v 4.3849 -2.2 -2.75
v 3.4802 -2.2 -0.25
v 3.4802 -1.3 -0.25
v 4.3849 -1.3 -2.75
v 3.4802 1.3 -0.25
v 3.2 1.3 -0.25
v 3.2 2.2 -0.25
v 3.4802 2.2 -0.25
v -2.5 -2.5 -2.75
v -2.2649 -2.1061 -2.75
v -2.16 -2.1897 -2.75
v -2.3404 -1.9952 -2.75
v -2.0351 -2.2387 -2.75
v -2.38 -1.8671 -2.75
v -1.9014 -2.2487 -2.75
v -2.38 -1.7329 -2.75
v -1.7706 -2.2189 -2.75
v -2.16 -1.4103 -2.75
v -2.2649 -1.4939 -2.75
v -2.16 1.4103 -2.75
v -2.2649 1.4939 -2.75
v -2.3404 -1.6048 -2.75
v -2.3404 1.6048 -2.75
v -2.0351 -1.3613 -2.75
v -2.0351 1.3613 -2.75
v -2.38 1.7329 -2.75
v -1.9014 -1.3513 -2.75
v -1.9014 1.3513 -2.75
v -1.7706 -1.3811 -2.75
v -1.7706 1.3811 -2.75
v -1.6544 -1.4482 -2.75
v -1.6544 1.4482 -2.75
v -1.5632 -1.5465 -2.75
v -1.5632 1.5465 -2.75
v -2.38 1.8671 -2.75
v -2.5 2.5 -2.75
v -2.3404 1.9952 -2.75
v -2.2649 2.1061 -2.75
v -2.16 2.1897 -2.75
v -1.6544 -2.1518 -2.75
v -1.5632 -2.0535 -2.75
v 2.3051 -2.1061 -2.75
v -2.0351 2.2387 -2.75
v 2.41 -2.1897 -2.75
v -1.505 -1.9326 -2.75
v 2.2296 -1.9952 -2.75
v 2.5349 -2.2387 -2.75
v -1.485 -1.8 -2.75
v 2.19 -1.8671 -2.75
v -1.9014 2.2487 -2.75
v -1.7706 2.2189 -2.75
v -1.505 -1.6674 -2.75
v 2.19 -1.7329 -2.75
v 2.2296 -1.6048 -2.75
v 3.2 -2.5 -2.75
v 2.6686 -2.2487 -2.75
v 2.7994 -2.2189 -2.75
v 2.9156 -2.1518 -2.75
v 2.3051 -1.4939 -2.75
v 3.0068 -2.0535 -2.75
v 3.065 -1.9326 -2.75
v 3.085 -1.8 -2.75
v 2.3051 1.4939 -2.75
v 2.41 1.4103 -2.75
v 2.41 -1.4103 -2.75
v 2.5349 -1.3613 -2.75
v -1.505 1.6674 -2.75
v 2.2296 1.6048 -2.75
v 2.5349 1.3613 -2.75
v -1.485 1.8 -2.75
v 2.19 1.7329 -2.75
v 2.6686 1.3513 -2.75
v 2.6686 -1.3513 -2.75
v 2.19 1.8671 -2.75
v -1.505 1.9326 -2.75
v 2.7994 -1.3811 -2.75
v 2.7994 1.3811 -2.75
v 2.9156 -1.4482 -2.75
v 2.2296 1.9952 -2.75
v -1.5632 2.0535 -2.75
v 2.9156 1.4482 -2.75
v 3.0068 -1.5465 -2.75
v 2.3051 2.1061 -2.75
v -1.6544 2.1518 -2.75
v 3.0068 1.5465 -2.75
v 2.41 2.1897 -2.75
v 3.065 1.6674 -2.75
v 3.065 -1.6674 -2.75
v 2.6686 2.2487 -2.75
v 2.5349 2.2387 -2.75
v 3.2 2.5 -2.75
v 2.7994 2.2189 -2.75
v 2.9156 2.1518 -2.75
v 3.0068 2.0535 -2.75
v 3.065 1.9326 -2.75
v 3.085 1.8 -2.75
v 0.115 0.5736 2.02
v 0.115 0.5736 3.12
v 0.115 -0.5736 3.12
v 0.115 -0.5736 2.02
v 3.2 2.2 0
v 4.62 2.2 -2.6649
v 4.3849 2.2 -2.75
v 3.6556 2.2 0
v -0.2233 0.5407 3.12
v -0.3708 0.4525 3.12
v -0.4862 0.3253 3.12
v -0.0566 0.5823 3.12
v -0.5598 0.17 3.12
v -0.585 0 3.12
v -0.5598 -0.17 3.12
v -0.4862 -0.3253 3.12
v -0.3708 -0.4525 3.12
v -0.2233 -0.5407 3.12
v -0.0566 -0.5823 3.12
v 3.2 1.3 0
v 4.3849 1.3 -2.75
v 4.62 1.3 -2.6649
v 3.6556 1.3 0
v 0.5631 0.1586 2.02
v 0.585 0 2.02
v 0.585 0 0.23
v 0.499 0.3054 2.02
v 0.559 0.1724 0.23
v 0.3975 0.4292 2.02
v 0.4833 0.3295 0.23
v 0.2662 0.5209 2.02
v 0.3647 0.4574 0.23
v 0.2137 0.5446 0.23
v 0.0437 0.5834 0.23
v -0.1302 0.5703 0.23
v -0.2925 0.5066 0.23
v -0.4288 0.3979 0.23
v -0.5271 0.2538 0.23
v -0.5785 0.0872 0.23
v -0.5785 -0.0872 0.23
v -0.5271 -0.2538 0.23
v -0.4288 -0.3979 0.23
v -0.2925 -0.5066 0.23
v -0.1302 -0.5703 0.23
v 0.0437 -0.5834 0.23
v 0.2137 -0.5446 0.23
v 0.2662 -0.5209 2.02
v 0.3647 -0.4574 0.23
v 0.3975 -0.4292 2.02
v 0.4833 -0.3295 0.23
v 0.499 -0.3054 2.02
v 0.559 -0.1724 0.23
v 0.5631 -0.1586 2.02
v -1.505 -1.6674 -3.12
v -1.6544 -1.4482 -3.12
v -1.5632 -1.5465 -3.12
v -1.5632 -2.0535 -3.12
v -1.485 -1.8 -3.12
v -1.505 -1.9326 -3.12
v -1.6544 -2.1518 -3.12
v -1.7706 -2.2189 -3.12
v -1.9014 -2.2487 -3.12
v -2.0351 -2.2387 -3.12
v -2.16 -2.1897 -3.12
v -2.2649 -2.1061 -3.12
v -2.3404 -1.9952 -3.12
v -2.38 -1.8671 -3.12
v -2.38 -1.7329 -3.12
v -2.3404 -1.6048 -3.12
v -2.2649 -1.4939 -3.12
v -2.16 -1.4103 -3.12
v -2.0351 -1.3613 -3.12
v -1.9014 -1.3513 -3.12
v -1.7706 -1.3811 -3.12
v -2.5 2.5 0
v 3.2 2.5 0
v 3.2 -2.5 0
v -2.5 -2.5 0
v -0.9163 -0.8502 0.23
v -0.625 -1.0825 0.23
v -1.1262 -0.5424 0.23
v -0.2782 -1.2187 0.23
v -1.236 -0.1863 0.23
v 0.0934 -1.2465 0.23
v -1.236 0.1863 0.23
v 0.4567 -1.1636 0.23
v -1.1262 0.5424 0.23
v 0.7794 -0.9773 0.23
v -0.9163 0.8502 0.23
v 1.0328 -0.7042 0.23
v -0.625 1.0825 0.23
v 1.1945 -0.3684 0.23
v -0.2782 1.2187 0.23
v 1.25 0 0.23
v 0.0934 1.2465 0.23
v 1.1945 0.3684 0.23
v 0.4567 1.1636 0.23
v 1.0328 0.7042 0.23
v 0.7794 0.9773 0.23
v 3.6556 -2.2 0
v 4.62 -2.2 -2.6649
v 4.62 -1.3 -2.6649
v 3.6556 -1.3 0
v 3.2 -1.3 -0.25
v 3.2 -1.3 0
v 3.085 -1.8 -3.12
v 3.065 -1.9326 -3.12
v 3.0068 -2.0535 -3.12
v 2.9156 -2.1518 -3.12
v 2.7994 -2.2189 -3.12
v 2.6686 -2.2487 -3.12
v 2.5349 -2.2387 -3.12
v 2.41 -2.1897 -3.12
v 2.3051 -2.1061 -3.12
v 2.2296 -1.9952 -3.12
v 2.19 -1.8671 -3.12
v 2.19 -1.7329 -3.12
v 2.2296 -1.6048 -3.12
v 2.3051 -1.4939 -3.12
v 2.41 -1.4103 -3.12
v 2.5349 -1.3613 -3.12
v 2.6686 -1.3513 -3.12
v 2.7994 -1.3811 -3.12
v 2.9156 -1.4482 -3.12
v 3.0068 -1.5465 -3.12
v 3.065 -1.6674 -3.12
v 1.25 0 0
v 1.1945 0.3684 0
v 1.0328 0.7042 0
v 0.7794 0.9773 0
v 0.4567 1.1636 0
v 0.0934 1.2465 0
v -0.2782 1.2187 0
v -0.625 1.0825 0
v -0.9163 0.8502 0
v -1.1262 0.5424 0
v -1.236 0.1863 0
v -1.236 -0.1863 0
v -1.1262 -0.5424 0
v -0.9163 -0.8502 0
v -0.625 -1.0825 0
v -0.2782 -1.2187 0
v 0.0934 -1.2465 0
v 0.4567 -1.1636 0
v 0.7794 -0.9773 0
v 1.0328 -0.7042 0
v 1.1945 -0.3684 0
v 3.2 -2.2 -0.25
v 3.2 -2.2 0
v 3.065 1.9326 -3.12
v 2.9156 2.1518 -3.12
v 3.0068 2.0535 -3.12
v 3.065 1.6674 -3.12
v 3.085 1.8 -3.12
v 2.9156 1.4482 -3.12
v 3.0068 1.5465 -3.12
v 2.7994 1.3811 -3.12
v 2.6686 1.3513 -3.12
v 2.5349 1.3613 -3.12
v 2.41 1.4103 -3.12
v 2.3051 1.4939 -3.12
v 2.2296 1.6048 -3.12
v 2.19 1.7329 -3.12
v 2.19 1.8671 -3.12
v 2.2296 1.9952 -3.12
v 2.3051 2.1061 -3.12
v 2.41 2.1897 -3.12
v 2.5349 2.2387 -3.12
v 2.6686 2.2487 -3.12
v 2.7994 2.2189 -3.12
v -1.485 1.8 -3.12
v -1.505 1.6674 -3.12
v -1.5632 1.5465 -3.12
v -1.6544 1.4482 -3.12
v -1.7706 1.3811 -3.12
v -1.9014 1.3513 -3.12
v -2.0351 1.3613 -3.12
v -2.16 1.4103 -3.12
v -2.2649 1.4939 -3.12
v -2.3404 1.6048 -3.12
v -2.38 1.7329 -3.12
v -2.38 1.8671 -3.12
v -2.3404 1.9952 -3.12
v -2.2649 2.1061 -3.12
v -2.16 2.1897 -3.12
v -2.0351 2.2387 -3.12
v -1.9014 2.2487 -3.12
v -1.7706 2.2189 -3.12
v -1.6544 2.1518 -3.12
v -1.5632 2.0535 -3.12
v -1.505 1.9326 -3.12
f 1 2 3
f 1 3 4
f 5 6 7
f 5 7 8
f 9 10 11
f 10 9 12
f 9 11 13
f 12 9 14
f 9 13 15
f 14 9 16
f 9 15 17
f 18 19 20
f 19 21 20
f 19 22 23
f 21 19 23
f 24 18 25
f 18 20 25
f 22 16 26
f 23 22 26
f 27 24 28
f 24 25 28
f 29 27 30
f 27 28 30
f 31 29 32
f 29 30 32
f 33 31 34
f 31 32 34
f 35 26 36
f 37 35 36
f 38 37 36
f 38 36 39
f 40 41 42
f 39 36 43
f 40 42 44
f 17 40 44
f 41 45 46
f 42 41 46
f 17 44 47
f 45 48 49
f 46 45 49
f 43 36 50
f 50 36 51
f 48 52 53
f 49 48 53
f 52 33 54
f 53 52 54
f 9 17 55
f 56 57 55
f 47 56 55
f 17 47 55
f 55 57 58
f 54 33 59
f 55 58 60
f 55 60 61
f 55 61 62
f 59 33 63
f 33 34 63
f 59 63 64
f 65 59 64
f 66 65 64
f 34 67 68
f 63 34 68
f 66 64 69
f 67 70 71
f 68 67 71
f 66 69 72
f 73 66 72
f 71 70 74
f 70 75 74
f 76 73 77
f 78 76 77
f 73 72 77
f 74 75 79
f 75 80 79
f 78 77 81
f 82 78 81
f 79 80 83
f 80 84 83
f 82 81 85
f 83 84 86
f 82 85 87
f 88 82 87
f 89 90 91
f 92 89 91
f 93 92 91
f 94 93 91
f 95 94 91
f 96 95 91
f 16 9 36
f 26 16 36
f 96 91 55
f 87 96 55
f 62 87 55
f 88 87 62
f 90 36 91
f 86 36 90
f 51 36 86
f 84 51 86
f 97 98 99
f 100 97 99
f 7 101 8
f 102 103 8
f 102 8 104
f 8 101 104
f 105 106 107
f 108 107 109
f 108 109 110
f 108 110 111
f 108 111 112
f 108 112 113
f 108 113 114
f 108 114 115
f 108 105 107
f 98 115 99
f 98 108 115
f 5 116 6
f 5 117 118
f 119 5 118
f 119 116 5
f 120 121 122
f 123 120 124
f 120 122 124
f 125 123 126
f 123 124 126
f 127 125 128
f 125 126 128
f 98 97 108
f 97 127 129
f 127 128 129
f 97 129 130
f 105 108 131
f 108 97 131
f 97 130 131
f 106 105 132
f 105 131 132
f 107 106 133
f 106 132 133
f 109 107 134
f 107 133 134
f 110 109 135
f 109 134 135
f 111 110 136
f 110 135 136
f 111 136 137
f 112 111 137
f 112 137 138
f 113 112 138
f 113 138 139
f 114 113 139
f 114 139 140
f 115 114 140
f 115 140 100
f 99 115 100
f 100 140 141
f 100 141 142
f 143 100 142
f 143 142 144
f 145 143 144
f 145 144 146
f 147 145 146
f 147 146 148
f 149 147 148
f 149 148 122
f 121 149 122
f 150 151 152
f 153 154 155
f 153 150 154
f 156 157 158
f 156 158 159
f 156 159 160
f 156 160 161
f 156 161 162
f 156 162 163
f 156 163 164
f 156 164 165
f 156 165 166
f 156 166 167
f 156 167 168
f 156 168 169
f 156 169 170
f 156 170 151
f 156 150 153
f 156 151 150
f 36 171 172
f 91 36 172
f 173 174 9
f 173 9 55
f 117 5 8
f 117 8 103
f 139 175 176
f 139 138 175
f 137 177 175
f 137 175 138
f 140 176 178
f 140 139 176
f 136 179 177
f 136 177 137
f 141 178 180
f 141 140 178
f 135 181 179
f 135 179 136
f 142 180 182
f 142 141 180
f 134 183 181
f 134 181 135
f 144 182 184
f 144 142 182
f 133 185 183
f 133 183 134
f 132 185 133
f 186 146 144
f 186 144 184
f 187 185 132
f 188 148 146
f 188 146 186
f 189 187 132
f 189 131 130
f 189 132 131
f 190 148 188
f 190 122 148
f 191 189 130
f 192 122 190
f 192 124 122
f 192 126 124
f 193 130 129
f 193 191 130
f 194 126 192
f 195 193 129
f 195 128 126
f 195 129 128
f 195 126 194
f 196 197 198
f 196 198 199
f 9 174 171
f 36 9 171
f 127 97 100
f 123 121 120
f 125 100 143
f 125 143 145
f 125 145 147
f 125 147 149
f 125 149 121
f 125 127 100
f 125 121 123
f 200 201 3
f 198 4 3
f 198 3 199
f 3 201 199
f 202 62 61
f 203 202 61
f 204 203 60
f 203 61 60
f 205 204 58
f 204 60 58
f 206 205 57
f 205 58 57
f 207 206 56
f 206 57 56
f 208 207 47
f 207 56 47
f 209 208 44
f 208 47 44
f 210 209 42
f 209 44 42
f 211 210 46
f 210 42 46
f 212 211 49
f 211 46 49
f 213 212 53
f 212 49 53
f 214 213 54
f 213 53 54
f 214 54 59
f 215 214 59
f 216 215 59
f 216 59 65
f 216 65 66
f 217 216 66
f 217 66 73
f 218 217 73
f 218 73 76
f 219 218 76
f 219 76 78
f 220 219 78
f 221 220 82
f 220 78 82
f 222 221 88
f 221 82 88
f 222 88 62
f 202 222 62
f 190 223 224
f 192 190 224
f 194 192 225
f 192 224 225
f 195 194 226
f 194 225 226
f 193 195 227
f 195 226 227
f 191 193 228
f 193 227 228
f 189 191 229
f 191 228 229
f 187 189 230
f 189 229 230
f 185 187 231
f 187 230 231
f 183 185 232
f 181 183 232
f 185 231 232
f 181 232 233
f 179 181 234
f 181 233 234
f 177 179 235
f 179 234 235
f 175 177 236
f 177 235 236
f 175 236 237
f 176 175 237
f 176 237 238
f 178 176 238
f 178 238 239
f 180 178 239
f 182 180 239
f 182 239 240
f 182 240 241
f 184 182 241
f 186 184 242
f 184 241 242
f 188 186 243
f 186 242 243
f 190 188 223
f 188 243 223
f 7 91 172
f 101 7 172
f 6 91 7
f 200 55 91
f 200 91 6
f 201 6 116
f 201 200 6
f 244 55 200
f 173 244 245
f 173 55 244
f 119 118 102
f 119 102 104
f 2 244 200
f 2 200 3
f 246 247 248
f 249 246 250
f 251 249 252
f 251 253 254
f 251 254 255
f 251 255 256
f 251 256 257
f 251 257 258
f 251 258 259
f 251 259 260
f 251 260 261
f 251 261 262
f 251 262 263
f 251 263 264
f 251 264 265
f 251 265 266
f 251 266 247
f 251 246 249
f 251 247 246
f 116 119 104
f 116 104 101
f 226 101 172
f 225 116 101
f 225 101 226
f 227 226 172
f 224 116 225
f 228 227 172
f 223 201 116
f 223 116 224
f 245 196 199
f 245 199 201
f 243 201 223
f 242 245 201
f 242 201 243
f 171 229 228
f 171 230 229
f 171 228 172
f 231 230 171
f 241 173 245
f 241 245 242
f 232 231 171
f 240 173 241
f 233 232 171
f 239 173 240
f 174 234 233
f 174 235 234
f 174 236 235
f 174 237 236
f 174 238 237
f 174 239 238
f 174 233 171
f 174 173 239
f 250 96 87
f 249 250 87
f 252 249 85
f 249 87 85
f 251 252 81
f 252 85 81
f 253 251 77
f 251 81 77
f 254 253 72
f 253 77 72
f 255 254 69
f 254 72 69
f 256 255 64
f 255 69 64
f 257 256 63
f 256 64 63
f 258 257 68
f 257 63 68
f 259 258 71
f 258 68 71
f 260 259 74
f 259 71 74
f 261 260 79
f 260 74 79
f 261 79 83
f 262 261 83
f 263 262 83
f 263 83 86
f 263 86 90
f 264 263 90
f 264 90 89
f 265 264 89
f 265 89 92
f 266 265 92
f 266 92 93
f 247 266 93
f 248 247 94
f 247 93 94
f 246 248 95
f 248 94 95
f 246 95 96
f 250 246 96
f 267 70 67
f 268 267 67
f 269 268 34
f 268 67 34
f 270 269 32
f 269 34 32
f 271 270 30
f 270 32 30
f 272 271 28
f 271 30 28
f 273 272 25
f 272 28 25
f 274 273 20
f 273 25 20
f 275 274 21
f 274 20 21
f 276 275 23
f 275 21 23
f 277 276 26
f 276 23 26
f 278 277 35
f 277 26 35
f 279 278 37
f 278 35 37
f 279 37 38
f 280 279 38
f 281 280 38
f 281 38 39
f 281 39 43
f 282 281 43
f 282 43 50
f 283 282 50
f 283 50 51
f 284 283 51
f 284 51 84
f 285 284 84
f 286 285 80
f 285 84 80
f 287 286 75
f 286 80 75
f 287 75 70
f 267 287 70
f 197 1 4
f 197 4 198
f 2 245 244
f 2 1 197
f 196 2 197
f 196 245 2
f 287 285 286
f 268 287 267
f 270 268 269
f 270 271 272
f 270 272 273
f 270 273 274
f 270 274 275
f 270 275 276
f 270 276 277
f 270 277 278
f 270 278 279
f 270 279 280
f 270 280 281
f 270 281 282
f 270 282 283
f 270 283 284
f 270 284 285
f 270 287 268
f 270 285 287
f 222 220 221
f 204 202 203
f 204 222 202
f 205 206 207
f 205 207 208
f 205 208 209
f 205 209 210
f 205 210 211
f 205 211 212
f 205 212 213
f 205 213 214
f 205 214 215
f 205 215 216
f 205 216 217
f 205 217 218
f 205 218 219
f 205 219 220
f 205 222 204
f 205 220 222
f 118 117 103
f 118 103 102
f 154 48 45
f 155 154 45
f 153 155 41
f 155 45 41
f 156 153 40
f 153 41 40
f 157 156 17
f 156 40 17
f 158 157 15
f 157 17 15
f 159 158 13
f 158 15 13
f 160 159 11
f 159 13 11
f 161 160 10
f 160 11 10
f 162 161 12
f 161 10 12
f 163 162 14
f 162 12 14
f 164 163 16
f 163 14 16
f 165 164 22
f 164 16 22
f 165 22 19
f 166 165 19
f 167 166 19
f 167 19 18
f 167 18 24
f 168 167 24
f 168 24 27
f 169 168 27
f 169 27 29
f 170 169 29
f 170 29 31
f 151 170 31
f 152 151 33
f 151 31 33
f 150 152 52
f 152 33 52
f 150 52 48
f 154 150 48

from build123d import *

# Parameters (mm, degrees)
F0_W           = 5.7
F0_H           = 5
F1_DEPTH       = 2.75
F2_R           = 1.25
F2_R_2         = 0.585
F3_DEPTH       = 0.23
F4_DEPTH       = 3.12
F6_DEPTH       = 1.1
F7_R           = 0.45
F8_DEPTH       = 0.37
F10_DEPTH      = 2.2
F10_DEPTH_BACK = 2.2
F11_W          = 1.42
F11_H          = 2.75
F12_DEPTH      = 1.3
F12_DEPTH_BACK = 1.3


with BuildPart() as f1:
    # F0 (on Top) → F1 (new body)
    with BuildSketch(Plane.XY):
        with Locations((0.35, 0)):
            Rectangle(F0_W, F0_H)
    extrude(amount=-F1_DEPTH)

    # F2 (on face) → F3 (join)
    with BuildSketch(Plane.XY):
        Circle(F2_R)
        Circle(F2_R_2, mode=Mode.SUBTRACT)
    extrude(amount=F3_DEPTH)

    # F4 (add): a face of the model
    f4_faces = [f1.faces().sort_by_distance(p)[0] for p in [
        (0, 0, 0),
    ]]
    extrude(f4_faces, amount=F4_DEPTH)

    # F5 (on face) → F6 (cut)
    with BuildSketch(Plane.XY.offset(3.12)):
        with BuildLine():
            ThreePointArc((0.115, -0.573585216), (0.585, 0), (0.115, 0.573585216))
            Line((0.115, 0.573585216), (0.115, -0.573585216))
        make_face()
    extrude(amount=-F6_DEPTH, mode=Mode.SUBTRACT)

    # F7 (on face) → F8 (join)
    with BuildSketch(Plane(origin=(0, 0, -2.75), x_dir=(1, 0, 0), z_dir=(0, 0, -1))):
        with Locations((2.635, 1.8)):
            Circle(F7_R)
        with Locations((-1.935, 1.8)):
            Circle(F7_R)
        with Locations((-1.935, -1.8)):
            Circle(F7_R)
        with Locations((2.635, -1.8)):
            Circle(F7_R)
    extrude(amount=F8_DEPTH)

    # F9 (on Front) → F10 (join, two sides)
    with BuildSketch(Plane.XZ) as f10_sk:
        Polygon((3.6556336897, 0), (3.2, 0), (3.2, -0.25), (3.4802363597, -0.25), (4.3849187925, -2.75), (4.62, -2.6649304645), align=None)
    extrude(amount=F10_DEPTH)
    extrude(f10_sk.sketch, amount=-F10_DEPTH_BACK)

    # F11 (on Front) → F12 (cut, two sides)
    with BuildSketch(Plane.XZ) as f12_sk:
        with Locations((3.91, -1.375)):
            Rectangle(F11_W, F11_H)
    extrude(amount=-F12_DEPTH, mode=Mode.SUBTRACT)
    extrude(f12_sk.sketch, amount=F12_DEPTH_BACK, mode=Mode.SUBTRACT)


solid = f1.part
